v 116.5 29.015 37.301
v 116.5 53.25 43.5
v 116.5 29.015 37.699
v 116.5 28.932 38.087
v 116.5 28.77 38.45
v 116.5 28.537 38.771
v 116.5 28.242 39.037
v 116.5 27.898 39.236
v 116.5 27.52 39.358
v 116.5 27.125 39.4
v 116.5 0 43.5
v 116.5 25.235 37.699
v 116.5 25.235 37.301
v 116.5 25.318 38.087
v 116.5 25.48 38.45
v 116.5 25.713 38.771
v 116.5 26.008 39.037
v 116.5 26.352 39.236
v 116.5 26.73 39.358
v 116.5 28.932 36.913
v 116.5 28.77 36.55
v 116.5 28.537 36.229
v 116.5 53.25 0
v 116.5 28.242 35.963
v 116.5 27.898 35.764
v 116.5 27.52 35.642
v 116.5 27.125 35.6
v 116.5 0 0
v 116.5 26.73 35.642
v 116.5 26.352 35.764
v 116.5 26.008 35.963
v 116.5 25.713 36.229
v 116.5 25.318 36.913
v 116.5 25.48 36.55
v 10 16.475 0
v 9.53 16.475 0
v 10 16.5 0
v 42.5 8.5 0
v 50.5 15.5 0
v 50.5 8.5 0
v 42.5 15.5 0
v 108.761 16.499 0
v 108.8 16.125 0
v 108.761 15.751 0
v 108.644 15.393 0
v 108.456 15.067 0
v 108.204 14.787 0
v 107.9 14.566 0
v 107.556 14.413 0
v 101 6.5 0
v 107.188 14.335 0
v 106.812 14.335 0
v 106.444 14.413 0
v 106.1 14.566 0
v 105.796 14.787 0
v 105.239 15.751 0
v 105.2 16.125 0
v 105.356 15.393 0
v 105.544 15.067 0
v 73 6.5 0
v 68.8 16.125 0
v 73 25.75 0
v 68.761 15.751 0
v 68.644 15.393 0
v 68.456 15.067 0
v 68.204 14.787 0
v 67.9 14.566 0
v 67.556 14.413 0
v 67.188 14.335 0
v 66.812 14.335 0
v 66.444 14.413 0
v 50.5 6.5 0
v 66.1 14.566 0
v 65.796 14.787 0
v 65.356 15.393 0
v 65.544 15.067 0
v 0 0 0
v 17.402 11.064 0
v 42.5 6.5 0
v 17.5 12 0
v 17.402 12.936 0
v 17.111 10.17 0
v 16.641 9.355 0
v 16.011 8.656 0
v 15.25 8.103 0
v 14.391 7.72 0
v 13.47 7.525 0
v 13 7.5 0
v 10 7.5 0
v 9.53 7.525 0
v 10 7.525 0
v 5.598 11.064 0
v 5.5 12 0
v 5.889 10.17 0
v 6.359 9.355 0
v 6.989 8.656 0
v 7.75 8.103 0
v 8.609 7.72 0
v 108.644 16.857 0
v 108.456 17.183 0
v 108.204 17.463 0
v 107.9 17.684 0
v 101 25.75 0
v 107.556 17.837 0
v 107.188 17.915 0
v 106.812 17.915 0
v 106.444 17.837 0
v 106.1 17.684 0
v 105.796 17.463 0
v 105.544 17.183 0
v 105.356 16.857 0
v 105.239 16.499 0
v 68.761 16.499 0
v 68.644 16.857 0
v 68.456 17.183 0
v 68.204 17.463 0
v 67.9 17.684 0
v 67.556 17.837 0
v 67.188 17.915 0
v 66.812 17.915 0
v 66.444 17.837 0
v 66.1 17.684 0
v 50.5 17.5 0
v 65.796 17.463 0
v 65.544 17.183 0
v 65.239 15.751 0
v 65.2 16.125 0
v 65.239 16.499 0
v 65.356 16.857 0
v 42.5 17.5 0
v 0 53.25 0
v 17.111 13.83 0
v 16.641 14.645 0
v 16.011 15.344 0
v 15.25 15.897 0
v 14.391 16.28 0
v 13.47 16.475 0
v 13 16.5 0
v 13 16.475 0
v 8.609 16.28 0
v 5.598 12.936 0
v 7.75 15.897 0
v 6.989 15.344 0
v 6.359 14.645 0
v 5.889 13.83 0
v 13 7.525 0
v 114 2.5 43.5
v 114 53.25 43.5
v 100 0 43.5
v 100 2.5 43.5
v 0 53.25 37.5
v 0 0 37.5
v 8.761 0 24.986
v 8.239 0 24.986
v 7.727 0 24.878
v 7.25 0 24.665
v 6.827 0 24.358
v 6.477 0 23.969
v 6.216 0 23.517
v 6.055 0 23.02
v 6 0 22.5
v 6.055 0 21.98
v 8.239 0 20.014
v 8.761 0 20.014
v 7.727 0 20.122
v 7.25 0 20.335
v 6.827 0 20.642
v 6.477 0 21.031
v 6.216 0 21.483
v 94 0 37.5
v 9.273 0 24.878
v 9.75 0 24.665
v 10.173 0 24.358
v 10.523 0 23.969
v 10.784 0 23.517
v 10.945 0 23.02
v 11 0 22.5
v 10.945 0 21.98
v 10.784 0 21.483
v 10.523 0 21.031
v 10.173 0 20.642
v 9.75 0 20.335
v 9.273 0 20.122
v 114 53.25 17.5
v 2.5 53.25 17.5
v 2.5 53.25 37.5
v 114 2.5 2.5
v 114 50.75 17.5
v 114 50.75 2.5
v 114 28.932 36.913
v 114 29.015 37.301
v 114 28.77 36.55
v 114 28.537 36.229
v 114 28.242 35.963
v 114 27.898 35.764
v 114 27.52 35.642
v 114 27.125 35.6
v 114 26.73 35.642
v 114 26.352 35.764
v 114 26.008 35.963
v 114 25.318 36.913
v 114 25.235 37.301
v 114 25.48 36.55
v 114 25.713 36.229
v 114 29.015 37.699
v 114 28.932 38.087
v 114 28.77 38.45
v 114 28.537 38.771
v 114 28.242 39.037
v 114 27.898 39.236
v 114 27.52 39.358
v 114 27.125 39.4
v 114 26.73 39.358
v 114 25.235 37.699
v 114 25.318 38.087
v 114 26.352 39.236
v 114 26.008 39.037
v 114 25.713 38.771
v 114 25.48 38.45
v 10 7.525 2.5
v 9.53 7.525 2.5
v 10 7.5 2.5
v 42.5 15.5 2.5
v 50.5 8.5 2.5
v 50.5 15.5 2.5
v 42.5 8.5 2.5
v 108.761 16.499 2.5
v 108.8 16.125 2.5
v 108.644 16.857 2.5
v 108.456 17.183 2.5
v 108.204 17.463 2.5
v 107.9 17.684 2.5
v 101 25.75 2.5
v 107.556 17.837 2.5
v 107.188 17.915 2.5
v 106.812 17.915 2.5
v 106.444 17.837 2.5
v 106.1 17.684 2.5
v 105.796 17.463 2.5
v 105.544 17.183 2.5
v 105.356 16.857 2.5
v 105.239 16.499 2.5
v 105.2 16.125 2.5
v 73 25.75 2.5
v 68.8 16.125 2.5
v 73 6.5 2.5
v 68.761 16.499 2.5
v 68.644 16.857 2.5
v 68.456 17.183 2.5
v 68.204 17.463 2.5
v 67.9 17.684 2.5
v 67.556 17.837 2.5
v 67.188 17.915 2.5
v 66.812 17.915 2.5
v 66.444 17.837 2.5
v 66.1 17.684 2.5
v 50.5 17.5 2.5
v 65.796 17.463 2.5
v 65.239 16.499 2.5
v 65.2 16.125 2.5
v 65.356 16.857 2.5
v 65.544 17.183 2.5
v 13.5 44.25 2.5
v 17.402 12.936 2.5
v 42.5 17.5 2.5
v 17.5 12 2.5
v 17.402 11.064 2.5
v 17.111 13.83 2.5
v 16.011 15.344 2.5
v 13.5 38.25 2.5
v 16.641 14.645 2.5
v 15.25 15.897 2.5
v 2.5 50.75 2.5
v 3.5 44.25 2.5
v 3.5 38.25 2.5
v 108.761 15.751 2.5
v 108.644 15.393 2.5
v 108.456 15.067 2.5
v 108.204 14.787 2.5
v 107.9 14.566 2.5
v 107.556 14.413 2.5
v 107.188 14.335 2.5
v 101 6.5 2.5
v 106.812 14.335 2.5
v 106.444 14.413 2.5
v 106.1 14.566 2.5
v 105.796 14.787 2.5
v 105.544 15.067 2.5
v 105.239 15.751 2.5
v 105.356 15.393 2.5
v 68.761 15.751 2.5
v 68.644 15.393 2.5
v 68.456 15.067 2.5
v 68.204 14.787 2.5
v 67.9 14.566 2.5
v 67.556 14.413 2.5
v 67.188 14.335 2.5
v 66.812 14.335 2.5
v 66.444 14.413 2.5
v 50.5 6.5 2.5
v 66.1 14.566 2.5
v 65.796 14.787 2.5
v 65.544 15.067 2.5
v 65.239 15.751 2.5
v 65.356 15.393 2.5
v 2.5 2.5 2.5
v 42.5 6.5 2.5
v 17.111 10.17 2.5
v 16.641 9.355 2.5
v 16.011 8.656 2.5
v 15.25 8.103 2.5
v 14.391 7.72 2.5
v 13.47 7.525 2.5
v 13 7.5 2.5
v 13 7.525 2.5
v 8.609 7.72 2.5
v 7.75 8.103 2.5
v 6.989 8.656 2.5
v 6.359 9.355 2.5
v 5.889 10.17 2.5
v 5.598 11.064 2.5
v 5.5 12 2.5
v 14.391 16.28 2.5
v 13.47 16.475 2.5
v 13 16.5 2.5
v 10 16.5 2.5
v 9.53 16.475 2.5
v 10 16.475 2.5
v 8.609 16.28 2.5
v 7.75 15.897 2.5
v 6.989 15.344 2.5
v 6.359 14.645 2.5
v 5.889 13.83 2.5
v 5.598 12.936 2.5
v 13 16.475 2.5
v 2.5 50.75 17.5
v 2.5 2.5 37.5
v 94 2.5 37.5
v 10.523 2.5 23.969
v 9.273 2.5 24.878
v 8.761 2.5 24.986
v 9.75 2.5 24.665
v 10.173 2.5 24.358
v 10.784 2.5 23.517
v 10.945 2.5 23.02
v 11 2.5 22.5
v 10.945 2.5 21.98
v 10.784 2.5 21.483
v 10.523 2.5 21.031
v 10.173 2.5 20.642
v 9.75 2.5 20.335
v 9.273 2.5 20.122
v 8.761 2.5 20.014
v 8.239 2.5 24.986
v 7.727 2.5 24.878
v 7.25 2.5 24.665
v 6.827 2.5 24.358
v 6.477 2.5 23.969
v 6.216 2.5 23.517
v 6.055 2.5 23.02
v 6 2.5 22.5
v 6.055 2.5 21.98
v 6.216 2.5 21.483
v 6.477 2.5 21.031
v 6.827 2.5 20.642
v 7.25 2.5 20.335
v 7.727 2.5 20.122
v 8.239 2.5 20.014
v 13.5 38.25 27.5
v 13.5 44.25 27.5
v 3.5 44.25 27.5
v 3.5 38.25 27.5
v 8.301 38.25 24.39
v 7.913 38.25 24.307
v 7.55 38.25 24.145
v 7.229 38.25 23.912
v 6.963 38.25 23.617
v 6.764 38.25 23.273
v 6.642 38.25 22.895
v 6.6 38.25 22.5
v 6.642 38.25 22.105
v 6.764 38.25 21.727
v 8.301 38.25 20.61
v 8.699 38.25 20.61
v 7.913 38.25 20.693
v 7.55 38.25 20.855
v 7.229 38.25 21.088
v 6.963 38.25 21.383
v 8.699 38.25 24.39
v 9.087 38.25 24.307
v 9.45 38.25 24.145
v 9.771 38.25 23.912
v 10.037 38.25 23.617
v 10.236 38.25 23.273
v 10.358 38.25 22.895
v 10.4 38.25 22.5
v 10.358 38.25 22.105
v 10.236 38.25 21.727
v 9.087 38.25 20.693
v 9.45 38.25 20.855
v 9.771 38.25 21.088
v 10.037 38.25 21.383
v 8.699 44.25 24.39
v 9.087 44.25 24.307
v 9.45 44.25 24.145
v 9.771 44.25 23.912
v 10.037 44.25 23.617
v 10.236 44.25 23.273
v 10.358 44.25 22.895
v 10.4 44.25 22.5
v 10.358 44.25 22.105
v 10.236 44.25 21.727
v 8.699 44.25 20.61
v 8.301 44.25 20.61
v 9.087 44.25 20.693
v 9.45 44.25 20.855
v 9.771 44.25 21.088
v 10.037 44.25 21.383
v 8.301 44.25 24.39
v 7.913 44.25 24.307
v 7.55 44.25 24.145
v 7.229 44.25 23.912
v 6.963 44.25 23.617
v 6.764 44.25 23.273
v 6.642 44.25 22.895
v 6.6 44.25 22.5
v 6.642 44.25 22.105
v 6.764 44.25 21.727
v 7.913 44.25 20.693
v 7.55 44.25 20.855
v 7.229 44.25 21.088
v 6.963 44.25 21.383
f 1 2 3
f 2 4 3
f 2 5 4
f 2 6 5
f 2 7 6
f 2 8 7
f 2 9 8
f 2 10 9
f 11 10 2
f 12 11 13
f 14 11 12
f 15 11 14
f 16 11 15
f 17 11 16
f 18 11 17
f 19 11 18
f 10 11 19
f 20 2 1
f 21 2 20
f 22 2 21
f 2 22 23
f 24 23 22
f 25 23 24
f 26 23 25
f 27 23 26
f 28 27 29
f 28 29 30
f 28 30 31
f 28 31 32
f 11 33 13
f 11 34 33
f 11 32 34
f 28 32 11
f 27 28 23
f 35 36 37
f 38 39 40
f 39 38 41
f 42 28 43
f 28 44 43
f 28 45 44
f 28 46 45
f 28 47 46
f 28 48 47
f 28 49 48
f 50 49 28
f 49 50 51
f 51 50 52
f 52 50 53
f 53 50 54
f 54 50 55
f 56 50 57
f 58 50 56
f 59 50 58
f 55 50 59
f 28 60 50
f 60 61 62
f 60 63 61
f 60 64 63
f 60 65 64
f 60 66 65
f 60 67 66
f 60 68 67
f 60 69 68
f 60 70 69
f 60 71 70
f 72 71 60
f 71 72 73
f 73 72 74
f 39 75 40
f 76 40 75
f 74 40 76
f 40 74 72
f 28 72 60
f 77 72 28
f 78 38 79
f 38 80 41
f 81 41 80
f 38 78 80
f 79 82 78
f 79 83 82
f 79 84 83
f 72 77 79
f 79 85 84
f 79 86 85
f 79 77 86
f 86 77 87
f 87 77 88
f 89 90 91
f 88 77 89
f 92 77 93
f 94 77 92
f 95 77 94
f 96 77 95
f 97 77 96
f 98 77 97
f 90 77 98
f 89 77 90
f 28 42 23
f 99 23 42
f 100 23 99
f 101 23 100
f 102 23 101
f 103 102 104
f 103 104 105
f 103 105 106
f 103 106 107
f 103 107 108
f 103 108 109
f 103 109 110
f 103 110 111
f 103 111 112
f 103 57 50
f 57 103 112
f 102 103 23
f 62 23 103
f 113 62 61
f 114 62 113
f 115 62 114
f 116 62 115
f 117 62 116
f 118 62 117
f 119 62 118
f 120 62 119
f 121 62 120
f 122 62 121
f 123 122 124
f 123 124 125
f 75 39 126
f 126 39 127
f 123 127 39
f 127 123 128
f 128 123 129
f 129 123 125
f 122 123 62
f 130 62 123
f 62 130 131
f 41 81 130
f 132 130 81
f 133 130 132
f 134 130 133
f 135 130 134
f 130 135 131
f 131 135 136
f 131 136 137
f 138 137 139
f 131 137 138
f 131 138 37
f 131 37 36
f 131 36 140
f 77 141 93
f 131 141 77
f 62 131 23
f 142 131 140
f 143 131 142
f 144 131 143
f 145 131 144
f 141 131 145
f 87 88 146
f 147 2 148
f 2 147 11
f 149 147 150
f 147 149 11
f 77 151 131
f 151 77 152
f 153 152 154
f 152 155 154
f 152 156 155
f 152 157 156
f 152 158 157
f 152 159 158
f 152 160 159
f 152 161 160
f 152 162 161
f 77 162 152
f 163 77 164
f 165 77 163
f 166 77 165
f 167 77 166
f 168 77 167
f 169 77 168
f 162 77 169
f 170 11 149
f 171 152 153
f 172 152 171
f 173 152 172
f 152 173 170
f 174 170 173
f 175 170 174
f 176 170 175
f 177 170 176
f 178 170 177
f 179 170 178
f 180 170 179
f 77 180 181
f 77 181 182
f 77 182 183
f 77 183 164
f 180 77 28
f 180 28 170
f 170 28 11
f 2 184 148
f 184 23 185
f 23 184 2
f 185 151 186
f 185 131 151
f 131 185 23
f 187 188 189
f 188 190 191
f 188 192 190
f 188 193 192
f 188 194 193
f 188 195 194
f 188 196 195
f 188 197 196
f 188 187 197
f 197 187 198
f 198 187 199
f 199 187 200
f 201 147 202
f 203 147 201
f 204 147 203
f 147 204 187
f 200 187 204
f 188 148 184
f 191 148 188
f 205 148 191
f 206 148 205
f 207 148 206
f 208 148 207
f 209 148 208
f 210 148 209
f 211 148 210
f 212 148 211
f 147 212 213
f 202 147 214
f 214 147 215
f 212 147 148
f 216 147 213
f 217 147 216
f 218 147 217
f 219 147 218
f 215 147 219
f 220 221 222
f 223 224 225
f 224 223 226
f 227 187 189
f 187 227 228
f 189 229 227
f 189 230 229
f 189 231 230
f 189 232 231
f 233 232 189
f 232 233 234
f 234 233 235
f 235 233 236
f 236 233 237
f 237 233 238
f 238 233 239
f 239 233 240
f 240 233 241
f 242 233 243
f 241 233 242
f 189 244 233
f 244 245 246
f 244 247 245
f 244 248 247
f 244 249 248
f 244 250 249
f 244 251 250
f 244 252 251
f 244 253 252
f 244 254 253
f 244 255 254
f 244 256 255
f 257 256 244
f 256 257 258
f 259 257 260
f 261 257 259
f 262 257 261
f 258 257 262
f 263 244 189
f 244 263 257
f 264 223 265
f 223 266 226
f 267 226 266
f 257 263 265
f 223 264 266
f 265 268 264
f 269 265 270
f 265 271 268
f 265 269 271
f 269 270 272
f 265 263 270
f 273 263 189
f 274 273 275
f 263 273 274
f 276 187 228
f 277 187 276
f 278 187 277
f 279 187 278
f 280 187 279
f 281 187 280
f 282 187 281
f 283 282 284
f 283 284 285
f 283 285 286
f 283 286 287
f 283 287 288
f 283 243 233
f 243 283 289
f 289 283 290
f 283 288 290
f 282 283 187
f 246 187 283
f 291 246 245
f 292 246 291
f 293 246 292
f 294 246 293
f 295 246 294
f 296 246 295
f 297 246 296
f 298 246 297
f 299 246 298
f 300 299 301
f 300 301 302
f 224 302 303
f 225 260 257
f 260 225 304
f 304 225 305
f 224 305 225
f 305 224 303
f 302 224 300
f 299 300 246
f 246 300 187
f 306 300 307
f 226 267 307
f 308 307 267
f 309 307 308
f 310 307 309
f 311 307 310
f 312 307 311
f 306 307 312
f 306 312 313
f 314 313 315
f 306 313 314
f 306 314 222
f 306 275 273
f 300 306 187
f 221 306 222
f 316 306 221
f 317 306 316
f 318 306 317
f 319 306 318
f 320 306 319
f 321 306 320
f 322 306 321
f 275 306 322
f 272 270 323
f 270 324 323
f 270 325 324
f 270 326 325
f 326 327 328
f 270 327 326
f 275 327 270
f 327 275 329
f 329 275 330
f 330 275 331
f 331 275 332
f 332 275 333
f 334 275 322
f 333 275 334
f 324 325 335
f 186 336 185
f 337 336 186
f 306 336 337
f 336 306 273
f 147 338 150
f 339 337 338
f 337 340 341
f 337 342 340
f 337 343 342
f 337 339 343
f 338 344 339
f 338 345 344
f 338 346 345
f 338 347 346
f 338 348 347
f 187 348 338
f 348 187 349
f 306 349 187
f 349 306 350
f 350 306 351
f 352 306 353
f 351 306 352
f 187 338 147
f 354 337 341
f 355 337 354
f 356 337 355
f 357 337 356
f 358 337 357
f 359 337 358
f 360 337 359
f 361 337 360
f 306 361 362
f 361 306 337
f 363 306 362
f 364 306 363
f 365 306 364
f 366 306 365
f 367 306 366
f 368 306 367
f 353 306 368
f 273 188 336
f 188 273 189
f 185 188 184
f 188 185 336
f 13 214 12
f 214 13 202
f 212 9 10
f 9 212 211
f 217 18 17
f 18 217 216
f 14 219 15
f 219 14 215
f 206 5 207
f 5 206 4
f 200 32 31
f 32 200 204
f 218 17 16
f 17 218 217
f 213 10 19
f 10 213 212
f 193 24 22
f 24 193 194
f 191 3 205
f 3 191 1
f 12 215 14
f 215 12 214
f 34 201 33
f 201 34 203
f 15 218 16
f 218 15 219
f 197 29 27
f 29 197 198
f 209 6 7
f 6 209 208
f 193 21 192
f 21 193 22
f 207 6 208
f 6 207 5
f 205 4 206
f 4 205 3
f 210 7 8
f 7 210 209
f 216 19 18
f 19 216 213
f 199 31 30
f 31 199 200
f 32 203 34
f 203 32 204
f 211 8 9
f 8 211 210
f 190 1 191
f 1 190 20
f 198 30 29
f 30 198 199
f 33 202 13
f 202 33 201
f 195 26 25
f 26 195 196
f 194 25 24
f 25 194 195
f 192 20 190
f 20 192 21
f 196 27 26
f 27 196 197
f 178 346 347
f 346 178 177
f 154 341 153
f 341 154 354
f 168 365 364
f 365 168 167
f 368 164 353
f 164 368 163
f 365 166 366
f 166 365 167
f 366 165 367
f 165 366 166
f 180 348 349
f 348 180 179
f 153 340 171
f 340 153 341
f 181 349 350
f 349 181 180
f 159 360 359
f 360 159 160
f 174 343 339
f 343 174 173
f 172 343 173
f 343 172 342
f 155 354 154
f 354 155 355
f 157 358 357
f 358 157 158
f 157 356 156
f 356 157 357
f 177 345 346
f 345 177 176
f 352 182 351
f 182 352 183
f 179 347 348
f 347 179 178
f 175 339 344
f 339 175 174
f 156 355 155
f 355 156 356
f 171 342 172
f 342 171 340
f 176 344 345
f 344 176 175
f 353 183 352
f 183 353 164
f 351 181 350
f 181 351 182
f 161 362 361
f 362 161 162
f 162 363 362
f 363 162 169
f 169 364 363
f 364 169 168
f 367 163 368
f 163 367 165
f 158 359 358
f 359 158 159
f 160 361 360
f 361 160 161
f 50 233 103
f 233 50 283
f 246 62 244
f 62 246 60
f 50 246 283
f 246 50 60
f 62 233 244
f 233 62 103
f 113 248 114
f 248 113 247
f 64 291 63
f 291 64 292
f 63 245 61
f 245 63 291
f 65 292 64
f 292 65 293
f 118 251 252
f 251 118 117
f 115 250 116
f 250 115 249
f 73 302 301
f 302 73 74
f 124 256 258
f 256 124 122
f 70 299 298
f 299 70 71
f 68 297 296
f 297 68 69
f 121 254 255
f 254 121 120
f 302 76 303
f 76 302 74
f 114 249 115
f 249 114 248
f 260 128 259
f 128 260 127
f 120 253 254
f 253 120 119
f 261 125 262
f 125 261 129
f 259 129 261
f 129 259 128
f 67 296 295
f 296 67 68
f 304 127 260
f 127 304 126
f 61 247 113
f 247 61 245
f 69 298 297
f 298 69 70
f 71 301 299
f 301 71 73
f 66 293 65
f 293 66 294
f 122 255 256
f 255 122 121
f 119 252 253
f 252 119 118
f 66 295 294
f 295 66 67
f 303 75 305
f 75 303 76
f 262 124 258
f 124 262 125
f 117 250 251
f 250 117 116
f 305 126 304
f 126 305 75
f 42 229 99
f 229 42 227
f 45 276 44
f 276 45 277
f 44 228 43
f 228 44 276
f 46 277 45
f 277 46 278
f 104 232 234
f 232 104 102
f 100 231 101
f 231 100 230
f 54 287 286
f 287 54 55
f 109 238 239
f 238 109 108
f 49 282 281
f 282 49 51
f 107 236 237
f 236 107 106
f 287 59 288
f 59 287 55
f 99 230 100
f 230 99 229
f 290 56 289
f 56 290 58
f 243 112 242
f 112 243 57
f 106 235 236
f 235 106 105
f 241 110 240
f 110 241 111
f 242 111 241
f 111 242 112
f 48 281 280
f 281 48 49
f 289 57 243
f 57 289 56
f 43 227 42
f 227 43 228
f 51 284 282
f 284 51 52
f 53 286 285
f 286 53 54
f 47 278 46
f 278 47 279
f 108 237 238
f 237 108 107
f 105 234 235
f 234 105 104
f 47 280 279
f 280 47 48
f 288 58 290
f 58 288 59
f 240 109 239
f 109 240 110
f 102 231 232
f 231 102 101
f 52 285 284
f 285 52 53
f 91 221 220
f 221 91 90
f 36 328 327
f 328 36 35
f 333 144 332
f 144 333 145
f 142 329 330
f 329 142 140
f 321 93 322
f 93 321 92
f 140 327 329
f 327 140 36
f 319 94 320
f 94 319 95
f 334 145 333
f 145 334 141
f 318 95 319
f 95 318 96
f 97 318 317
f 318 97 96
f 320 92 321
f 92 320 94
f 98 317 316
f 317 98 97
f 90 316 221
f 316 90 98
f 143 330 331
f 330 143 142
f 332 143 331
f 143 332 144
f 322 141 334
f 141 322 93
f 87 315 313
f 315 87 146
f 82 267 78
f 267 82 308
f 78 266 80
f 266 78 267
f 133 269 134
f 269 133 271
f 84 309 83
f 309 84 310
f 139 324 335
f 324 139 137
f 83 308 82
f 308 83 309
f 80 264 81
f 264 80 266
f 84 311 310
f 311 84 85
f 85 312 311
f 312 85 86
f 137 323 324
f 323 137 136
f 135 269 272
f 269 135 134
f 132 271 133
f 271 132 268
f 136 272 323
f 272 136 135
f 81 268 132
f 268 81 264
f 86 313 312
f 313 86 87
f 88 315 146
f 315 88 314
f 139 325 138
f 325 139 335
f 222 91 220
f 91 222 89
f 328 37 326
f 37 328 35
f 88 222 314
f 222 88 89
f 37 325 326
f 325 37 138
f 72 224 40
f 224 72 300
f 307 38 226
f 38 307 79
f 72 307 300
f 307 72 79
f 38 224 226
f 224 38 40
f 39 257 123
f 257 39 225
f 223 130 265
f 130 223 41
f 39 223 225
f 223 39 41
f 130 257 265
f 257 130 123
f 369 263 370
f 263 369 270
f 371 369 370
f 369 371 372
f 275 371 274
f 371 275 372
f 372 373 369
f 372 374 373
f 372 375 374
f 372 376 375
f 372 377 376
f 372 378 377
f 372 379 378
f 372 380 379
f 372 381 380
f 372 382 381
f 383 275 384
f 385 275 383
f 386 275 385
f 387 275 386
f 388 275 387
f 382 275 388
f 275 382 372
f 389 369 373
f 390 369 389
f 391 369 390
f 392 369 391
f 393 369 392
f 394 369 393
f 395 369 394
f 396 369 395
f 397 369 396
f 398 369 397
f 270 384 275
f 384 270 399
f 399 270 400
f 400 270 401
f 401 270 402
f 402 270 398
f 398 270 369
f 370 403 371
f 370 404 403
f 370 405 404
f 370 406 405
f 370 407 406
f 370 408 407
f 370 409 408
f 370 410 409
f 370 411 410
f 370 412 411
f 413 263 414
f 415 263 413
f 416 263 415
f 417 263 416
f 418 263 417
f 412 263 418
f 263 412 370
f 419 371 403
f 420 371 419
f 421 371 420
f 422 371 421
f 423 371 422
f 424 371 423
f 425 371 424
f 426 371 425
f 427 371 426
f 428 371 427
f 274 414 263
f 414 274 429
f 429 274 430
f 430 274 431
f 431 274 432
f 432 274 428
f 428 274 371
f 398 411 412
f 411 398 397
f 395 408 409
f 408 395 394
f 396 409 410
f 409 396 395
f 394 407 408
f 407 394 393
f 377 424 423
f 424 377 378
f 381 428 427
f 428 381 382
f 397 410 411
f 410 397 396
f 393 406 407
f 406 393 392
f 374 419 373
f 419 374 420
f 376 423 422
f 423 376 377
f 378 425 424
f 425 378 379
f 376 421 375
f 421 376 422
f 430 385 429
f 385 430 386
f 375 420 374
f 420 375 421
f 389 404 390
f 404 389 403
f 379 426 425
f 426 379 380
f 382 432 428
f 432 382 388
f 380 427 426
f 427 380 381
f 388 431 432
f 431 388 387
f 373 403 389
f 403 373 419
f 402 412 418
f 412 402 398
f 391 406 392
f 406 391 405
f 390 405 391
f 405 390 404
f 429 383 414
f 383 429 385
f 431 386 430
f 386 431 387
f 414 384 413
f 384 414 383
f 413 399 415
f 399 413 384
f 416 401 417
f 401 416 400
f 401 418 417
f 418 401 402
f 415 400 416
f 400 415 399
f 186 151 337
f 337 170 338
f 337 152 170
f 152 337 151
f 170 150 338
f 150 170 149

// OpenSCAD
// ========================================================================================
// Robori Mendel
// Power supply unit cover
// GNU GPL v3
//
// Contact : support@robori.com
// Reference : http://www.robori.com/documentation/Mendel
//
// History :
// 27 Mar 2015 - First version
// ========================================================================================

$fn = 30;

// Cover
cover_wall_t = 2.5;
cover_face_t = 2.5;
cover_face_dist = 15;
cover_overlap_dist = 26;		// terminal gap = 12mm
cover_l = 111 + 2*cover_wall_t + 0.5;
cover_w = 50 + cover_wall_t + 0.75;
cover_h = cover_face_t + cover_face_dist + cover_overlap_dist;

cover_screw_d = 3 + 0.8;
cover_screw2_driving_d = 5;
cover_screw2_block_l = 10;
cover_screw2_block_w = 6;
cover_screw2_block_h = cover_face_t + cover_face_dist + 10;

// Power socket
socket_l = 27 + 2*0.5;
socket_w = 18.25 + 2*0.5;
socket_screw_d = 3 + 0.6;

// Outlet
outlet_d = 8 + 1;
outlet_space = 3;
outlet_slot_l = 2*2.5 + 3;
outlet_slot_w = 2;
outlet_slot_space = 7;

optimized_psu_cover();
//psu_cover();

module optimized_psu_cover()
{
	cut_h = cover_overlap_dist - 20;
	excess_dist = 20;

	difference()
	{
		psu_cover();
		translate([-cover_wall_t - excess_dist, -1, cover_h - cut_h]) cube([cover_l, cover_w + 2, cut_h + 1]);
		//translate([cover_wall_t + 1, cover_w/2 + excess_dist, cover_h - cut_h]) cube([cover_l, cover_w, cut_h + 1]);
		translate([cover_l - cover_wall_t - excess_dist, -1, cover_h - cut_h]) rotate([0, 45, 0]) translate([-20, 0, 0]) cube([20, cover_wall_t + 2, 20]);
		//translate([cover_l - cover_wall_t - 1, cover_w/2 + excess_dist, cover_h - cut_h]) rotate([45, 0, 0]) cube([cover_wall_t + 2, 20, 20]);
	}
}

module psu_cover()
{
	// Cover screw 1 (right side)
	screw1 = [cover_l - cover_wall_t, cover_w/2 - 0.5, cover_h - cover_face_t - cover_face_dist - 20];

	// Cover screw 2 block (front left)
	screw2_block = [cover_wall_t + 1, 9, cover_h - cover_screw2_block_h];

	// Power socket
	socket_x = cover_l - cover_wall_t - socket_l - 10 - 3;  // screw holder + spare
	socket_y = cover_w - cover_wall_t - socket_w - 2 - 2;	// socket frame + spare
	socket_screw_dist = 6;
	
	// Outlet
	outlet_x = cover_wall_t + outlet_d/2 + 3;
	outlet_y = cover_w - cover_wall_t - outlet_d/2 - 5;
	outlet_slot_dist = outlet_d/2 + 28;

	translate([0, cover_w, cover_h]) rotate([180, 0, 0]) union()
	{
		difference()
		{
			// Cover
			cube([cover_l, cover_w, cover_h]);
			translate([cover_wall_t, cover_wall_t, -cover_face_t]) cube([cover_l - 2*cover_wall_t, cover_w - 2*cover_wall_t, cover_h]);
			// Overlap cut
			translate([cover_wall_t, -1, -1]) cube([cover_l - 2*cover_wall_t, cover_wall_t + 2, cover_overlap_dist + 1]);
			// Screw 1
			translate([screw1[0] - 1, screw1[1], screw1[2]]) rotate([0, 90, 0]) cylinder(r=cover_screw_d/2, h=cover_wall_t + 2, center=false);
			// Screw 2 driving hole
			translate([screw2_block[0] + cover_screw2_block_l/2, cover_w + 1 , cover_h - cover_screw2_block_h + 5]) rotate([90, 0, 0]) cylinder(r=cover_screw2_driving_d/2, h=cover_wall_t + 2, center=false);
			// Power socket
			translate([socket_x, socket_y, 0]) cube([socket_l, socket_w, cover_h + 1]);
			// Power socket screws
			translate([socket_x - socket_screw_dist, socket_y + socket_w/2, 0]) cylinder(r=socket_screw_d/2, h=cover_h + 1, center=false);
			translate([socket_x + socket_l + socket_screw_dist, socket_y + socket_w/2, 0]) cylinder(r=socket_screw_d/2, h=cover_h + 1, center=false);
			// Outlet
			translate([outlet_x, outlet_y, 0]) cylinder(r=outlet_d/2, h=cover_h + 1, center=false);
			translate([outlet_x + outlet_space, outlet_y, 0]) cylinder(r=outlet_d/2, h=cover_h + 1, center=false);
			translate([outlet_x, outlet_y - outlet_d/2, 0]) cube([outlet_space, outlet_d, cover_h + 1]);
			// Outlet slots
			translate([outlet_x + outlet_slot_dist, outlet_y + outlet_slot_space/2, 0]) cube([outlet_slot_l, outlet_slot_w, cover_h + 1]);
			translate([outlet_x + outlet_slot_dist, outlet_y - outlet_slot_space/2 - outlet_slot_w, 0]) cube([outlet_slot_l, outlet_slot_w, cover_h + 1]);
		}
		// Screw 2 block
		translate(screw2_block) cover_screw2_block();
	}
}

module cover_screw2_block()
{
	difference()
	{
		cube([cover_screw2_block_l, cover_screw2_block_w, cover_screw2_block_h]);
		translate([cover_screw2_block_l/2, -1, 5]) rotate([-90, 0, 0]) cylinder(r=cover_screw_d/2, h=cover_screw2_block_w + 2, center=false);
	}
}
